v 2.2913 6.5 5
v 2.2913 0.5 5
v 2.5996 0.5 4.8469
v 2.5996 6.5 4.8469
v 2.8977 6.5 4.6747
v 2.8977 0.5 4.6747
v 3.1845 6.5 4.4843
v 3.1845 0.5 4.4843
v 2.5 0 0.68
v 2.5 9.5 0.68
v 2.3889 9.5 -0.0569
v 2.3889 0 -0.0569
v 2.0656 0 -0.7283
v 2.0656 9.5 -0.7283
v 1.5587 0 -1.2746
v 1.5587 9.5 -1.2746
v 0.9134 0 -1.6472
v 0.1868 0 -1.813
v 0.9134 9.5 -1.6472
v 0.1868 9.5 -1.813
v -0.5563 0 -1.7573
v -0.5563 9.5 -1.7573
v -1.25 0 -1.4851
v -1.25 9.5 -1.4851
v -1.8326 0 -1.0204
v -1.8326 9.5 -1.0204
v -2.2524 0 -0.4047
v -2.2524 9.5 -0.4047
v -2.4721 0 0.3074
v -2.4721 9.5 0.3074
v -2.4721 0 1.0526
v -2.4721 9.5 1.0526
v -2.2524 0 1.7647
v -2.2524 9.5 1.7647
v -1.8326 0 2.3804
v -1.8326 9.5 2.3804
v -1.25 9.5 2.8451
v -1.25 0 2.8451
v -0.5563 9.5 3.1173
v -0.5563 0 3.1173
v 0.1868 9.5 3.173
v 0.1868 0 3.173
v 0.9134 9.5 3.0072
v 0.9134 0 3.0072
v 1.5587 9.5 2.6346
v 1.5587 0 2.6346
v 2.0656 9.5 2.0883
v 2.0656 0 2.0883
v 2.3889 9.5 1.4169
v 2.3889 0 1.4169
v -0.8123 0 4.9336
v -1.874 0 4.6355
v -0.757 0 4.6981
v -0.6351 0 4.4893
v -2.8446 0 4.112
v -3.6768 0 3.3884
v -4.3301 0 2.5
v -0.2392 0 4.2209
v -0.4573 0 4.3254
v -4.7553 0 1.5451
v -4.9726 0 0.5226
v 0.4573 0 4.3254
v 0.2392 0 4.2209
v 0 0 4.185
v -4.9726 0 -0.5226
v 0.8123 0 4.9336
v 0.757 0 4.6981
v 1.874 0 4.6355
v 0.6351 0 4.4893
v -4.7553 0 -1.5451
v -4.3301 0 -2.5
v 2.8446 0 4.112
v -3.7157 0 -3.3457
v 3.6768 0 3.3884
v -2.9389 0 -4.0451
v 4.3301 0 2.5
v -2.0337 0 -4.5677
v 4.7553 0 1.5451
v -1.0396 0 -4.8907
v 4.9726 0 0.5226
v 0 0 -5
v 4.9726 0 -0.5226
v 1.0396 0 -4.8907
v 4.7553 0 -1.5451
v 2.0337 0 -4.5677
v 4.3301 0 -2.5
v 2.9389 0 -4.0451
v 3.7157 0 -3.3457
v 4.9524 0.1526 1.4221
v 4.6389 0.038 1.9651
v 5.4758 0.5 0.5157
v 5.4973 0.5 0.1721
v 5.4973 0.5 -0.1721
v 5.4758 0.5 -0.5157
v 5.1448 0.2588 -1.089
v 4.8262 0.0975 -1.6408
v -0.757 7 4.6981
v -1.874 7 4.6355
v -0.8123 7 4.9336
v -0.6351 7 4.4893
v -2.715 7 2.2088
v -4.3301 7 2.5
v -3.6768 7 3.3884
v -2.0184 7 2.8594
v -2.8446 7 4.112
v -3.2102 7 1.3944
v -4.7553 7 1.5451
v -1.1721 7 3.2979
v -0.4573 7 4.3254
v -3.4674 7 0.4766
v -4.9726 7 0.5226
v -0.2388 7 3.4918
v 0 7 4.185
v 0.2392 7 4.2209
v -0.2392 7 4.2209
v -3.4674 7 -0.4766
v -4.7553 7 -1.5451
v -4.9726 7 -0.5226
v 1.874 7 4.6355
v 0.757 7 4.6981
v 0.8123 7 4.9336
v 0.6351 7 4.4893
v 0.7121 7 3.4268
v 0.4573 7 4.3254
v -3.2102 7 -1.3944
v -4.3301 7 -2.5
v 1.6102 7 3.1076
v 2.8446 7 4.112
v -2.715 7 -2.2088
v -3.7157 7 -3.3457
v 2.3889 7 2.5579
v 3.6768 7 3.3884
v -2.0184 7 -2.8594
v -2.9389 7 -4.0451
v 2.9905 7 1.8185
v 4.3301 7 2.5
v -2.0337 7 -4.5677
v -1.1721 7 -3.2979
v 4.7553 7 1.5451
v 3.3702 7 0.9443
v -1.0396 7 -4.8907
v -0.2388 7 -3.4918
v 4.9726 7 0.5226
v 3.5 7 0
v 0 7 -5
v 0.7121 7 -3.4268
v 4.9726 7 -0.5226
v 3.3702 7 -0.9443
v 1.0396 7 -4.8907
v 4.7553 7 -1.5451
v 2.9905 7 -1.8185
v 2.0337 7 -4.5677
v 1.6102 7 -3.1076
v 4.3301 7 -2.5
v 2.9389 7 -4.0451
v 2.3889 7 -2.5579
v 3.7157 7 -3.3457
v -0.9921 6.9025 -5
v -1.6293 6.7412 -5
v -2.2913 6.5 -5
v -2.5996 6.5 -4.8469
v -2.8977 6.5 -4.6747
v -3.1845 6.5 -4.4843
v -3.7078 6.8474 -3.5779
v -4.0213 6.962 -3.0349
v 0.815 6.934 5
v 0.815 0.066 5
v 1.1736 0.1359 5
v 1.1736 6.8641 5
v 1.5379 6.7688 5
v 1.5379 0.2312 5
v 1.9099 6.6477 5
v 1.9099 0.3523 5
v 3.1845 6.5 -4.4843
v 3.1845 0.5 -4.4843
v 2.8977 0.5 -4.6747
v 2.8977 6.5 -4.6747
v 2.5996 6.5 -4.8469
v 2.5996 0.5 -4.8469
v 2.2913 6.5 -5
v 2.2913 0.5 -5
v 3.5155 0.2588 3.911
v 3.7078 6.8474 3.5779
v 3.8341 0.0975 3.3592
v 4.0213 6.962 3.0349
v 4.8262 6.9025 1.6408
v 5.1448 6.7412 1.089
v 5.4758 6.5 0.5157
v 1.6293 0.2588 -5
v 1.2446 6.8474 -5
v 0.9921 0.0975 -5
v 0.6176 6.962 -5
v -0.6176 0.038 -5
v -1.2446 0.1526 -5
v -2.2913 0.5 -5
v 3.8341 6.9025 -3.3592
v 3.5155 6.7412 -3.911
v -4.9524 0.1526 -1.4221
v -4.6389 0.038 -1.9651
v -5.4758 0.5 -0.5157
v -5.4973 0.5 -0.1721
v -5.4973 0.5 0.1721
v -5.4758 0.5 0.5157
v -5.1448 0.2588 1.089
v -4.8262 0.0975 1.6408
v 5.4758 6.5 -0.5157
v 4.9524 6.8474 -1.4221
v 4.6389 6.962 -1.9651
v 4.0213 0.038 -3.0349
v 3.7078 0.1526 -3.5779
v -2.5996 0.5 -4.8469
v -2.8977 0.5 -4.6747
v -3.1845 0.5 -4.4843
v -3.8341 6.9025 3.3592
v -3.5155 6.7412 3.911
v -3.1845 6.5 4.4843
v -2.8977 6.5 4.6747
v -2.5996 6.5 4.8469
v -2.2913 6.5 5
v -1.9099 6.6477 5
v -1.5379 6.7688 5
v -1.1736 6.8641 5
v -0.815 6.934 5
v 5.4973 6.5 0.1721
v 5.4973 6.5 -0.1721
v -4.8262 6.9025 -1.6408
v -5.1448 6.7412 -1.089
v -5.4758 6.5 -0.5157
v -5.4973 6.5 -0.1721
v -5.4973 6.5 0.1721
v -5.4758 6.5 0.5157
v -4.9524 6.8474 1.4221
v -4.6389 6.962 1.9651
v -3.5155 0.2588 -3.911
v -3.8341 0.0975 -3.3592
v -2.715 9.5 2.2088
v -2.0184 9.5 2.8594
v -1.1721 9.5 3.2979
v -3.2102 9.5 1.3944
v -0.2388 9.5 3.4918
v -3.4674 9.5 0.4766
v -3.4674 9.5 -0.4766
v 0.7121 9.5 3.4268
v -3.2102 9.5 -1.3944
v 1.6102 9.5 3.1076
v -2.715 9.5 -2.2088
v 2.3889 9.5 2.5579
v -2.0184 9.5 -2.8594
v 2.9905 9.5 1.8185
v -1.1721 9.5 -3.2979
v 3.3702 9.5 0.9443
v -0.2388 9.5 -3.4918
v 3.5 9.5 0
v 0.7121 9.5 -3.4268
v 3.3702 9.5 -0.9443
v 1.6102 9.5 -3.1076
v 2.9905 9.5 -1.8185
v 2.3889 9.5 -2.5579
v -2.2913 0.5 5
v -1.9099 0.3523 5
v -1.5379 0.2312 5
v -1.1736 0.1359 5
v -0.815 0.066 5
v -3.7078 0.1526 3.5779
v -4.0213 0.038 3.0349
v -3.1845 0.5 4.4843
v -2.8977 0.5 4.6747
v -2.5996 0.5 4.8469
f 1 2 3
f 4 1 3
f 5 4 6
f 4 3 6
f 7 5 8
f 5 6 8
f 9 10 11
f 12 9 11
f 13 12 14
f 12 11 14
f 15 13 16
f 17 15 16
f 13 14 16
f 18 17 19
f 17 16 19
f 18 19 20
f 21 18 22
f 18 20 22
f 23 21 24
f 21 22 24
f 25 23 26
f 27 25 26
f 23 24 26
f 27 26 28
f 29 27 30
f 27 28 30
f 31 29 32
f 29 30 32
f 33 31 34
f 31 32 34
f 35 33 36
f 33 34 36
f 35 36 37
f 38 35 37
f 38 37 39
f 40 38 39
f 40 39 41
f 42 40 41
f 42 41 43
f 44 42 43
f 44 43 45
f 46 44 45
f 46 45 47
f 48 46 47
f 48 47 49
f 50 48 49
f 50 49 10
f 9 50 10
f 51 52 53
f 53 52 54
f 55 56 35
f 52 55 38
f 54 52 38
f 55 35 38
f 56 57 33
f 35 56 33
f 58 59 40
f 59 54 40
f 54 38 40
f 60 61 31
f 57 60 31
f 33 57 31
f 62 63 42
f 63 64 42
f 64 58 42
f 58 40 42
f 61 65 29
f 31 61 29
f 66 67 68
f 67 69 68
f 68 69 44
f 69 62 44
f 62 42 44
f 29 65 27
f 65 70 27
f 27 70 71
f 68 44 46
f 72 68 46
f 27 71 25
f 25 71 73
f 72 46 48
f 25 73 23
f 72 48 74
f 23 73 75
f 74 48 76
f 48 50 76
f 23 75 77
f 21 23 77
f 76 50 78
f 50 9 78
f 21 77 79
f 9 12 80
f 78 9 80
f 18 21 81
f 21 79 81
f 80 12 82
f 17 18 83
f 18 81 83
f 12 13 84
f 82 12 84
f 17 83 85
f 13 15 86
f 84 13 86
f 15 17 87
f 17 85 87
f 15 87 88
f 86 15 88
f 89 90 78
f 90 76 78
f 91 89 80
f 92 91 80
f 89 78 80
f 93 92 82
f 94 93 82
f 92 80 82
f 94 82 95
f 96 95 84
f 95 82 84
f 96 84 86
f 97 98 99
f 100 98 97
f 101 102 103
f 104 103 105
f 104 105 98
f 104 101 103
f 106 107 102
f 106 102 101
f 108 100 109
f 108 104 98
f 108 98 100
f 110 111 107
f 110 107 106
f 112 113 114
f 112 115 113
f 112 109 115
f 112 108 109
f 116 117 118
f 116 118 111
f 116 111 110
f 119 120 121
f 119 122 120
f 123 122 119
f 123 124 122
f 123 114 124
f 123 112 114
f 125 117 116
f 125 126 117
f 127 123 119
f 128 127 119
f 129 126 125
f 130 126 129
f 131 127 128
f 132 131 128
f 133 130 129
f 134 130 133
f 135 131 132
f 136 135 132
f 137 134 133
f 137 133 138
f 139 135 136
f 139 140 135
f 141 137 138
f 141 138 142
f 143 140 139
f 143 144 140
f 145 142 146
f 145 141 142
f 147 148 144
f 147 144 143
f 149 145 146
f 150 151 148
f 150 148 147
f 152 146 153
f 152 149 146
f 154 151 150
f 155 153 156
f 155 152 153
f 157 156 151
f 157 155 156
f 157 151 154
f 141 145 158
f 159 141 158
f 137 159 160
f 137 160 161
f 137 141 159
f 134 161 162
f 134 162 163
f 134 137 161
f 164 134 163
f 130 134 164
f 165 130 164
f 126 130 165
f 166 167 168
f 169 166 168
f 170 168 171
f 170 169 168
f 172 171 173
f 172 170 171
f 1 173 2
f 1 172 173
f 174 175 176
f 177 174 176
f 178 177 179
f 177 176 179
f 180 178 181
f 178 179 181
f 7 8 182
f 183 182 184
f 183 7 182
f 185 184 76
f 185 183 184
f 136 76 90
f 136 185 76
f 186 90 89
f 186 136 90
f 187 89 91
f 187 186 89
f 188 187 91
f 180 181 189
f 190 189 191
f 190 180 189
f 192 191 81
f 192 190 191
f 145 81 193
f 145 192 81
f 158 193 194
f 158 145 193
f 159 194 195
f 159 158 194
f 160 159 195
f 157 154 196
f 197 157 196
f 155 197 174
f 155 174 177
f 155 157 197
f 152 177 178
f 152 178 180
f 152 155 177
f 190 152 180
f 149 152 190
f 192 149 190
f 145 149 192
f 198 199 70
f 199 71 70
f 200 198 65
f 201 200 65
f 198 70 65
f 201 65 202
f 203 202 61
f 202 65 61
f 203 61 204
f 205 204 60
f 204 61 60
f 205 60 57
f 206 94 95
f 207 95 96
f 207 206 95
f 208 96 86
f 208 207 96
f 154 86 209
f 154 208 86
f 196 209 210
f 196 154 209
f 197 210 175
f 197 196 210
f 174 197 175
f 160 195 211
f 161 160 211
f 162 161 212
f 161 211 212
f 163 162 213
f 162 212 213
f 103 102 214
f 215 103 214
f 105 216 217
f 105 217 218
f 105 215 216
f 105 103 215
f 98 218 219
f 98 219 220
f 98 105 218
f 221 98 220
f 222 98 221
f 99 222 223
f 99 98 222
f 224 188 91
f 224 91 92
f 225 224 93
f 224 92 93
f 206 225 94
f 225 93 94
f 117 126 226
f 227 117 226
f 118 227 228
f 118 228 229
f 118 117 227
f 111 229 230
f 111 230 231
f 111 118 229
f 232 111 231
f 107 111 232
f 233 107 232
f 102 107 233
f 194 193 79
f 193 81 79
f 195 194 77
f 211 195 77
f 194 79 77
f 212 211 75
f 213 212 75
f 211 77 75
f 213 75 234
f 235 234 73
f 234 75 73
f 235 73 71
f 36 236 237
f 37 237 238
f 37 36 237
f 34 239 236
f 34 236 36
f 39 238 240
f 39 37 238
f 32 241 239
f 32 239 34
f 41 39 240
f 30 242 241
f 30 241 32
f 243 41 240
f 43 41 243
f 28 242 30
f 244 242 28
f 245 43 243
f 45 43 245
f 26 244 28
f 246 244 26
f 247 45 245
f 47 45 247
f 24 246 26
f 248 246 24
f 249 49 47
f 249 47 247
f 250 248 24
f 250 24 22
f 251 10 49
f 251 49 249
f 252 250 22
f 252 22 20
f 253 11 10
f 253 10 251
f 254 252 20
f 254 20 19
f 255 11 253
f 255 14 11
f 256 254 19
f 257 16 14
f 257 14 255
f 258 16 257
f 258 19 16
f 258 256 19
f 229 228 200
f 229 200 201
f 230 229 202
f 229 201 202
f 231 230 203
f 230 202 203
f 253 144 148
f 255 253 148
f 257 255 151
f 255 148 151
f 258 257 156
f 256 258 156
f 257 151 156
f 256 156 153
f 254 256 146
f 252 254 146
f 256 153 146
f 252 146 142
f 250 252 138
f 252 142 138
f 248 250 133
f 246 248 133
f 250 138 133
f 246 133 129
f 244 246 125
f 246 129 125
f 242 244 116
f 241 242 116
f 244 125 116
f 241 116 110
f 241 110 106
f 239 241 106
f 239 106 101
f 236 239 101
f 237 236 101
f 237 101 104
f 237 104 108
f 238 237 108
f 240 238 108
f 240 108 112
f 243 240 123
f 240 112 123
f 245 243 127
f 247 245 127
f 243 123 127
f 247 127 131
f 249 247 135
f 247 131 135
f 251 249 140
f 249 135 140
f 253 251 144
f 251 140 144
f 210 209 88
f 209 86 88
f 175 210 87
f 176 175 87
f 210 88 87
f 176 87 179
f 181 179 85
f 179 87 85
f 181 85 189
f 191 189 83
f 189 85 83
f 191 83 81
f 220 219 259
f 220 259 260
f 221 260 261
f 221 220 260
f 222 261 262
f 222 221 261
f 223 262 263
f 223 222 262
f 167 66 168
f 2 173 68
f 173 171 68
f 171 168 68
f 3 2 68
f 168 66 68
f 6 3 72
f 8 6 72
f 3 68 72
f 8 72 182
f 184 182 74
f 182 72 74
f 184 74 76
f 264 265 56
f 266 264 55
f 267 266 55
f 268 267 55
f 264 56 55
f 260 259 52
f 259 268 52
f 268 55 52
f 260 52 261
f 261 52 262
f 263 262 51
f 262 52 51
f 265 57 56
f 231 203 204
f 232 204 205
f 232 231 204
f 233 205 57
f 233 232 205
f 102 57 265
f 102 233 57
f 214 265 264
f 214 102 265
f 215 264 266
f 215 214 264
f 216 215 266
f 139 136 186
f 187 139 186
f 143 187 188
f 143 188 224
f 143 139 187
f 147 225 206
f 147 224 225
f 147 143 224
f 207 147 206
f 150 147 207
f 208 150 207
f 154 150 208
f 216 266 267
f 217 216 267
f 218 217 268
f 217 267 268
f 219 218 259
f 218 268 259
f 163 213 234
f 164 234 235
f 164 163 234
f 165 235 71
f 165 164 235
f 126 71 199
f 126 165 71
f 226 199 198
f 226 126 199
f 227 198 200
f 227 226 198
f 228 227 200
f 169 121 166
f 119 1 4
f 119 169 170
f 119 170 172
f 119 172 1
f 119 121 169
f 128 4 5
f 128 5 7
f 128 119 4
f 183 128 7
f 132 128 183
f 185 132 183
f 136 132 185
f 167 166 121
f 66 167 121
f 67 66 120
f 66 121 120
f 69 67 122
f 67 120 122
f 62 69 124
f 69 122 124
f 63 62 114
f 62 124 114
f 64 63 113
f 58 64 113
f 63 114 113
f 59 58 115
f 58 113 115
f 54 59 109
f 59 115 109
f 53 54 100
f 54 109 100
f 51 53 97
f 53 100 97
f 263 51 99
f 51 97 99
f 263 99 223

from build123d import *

# Parameters (mm, degrees)
SKETCH2_R           = 5.5
BOSS_EXTRUDE2_DEPTH = 7
CHAMFER1_SIZE       = 0.5
SKETCH3_R           = 7.5
CUT_EXTRUDE1_DEPTH  = 8
CUT_EXTRUDE2_DEPTH  = 8
SKETCH5_R           = 3.5
BOSS_EXTRUDE3_DEPTH = 2.5
SKETCH6_R           = 2.5
CUT_EXTRUDE3_DEPTH  = 10.5000001


with BuildPart() as part:
    # Sketch2 → Boss-Extrude2 (new body)
    with BuildSketch(Plane(origin=(0, 0, 0), x_dir=(1, 0, 0), z_dir=(0, 1, 0))):
        Circle(SKETCH2_R)
    extrude(amount=BOSS_EXTRUDE2_DEPTH)

    # Chamfer1
    chamfer1_edges = [part.edges().sort_by_distance(p)[0] for p in [
        (-5.5, 0, 0),
        (-5.5, 7, 0),
    ]]
    chamfer(chamfer1_edges, length=CHAMFER1_SIZE)

    # Sketch3 → Cut-Extrude1 (cut, through all)
    with BuildSketch(Plane(origin=(0, 7, 0), x_dir=(1, 0, 0), z_dir=(0, 1, 0))):
        Circle(SKETCH3_R)
        Polygon((5.773502692, 0), (2.886751346, 5), (-2.886751346, 5), (-5.773502692, 0), (-2.886751346, -5), (2.886751346, -5), align=None, mode=Mode.SUBTRACT)
    extrude(amount=-CUT_EXTRUDE1_DEPTH, mode=Mode.SUBTRACT)

    # Sketch4 → Cut-Extrude2 (cut, through all)
    with BuildSketch(Plane(origin=(0, 7, 0), x_dir=(1, 0, 0), z_dir=(0, 1, 0))):
        with BuildLine():
            Line((-0.815, -5), (0.815, -5))
            ThreePointArc((0.815, -5), (0, -4.185), (-0.815, -5))
        make_face()
    extrude(amount=-CUT_EXTRUDE2_DEPTH, mode=Mode.SUBTRACT)

    # Sketch5 → Boss-Extrude3 (add)
    with BuildSketch(Plane(origin=(0, 7, 0), x_dir=(1, 0, 0), z_dir=(0, 1, 0))):
        Circle(SKETCH5_R)
    extrude(amount=BOSS_EXTRUDE3_DEPTH)

    # Sketch6 → Cut-Extrude3 (cut, through all)
    with BuildSketch(Plane(origin=(0, 9.5, 0), x_dir=(1, 0, 0), z_dir=(0, 1, 0))):
        with Locations((0, -0.68)):
            Circle(SKETCH6_R)
    extrude(amount=-CUT_EXTRUDE3_DEPTH, mode=Mode.SUBTRACT)


solid = part.part
